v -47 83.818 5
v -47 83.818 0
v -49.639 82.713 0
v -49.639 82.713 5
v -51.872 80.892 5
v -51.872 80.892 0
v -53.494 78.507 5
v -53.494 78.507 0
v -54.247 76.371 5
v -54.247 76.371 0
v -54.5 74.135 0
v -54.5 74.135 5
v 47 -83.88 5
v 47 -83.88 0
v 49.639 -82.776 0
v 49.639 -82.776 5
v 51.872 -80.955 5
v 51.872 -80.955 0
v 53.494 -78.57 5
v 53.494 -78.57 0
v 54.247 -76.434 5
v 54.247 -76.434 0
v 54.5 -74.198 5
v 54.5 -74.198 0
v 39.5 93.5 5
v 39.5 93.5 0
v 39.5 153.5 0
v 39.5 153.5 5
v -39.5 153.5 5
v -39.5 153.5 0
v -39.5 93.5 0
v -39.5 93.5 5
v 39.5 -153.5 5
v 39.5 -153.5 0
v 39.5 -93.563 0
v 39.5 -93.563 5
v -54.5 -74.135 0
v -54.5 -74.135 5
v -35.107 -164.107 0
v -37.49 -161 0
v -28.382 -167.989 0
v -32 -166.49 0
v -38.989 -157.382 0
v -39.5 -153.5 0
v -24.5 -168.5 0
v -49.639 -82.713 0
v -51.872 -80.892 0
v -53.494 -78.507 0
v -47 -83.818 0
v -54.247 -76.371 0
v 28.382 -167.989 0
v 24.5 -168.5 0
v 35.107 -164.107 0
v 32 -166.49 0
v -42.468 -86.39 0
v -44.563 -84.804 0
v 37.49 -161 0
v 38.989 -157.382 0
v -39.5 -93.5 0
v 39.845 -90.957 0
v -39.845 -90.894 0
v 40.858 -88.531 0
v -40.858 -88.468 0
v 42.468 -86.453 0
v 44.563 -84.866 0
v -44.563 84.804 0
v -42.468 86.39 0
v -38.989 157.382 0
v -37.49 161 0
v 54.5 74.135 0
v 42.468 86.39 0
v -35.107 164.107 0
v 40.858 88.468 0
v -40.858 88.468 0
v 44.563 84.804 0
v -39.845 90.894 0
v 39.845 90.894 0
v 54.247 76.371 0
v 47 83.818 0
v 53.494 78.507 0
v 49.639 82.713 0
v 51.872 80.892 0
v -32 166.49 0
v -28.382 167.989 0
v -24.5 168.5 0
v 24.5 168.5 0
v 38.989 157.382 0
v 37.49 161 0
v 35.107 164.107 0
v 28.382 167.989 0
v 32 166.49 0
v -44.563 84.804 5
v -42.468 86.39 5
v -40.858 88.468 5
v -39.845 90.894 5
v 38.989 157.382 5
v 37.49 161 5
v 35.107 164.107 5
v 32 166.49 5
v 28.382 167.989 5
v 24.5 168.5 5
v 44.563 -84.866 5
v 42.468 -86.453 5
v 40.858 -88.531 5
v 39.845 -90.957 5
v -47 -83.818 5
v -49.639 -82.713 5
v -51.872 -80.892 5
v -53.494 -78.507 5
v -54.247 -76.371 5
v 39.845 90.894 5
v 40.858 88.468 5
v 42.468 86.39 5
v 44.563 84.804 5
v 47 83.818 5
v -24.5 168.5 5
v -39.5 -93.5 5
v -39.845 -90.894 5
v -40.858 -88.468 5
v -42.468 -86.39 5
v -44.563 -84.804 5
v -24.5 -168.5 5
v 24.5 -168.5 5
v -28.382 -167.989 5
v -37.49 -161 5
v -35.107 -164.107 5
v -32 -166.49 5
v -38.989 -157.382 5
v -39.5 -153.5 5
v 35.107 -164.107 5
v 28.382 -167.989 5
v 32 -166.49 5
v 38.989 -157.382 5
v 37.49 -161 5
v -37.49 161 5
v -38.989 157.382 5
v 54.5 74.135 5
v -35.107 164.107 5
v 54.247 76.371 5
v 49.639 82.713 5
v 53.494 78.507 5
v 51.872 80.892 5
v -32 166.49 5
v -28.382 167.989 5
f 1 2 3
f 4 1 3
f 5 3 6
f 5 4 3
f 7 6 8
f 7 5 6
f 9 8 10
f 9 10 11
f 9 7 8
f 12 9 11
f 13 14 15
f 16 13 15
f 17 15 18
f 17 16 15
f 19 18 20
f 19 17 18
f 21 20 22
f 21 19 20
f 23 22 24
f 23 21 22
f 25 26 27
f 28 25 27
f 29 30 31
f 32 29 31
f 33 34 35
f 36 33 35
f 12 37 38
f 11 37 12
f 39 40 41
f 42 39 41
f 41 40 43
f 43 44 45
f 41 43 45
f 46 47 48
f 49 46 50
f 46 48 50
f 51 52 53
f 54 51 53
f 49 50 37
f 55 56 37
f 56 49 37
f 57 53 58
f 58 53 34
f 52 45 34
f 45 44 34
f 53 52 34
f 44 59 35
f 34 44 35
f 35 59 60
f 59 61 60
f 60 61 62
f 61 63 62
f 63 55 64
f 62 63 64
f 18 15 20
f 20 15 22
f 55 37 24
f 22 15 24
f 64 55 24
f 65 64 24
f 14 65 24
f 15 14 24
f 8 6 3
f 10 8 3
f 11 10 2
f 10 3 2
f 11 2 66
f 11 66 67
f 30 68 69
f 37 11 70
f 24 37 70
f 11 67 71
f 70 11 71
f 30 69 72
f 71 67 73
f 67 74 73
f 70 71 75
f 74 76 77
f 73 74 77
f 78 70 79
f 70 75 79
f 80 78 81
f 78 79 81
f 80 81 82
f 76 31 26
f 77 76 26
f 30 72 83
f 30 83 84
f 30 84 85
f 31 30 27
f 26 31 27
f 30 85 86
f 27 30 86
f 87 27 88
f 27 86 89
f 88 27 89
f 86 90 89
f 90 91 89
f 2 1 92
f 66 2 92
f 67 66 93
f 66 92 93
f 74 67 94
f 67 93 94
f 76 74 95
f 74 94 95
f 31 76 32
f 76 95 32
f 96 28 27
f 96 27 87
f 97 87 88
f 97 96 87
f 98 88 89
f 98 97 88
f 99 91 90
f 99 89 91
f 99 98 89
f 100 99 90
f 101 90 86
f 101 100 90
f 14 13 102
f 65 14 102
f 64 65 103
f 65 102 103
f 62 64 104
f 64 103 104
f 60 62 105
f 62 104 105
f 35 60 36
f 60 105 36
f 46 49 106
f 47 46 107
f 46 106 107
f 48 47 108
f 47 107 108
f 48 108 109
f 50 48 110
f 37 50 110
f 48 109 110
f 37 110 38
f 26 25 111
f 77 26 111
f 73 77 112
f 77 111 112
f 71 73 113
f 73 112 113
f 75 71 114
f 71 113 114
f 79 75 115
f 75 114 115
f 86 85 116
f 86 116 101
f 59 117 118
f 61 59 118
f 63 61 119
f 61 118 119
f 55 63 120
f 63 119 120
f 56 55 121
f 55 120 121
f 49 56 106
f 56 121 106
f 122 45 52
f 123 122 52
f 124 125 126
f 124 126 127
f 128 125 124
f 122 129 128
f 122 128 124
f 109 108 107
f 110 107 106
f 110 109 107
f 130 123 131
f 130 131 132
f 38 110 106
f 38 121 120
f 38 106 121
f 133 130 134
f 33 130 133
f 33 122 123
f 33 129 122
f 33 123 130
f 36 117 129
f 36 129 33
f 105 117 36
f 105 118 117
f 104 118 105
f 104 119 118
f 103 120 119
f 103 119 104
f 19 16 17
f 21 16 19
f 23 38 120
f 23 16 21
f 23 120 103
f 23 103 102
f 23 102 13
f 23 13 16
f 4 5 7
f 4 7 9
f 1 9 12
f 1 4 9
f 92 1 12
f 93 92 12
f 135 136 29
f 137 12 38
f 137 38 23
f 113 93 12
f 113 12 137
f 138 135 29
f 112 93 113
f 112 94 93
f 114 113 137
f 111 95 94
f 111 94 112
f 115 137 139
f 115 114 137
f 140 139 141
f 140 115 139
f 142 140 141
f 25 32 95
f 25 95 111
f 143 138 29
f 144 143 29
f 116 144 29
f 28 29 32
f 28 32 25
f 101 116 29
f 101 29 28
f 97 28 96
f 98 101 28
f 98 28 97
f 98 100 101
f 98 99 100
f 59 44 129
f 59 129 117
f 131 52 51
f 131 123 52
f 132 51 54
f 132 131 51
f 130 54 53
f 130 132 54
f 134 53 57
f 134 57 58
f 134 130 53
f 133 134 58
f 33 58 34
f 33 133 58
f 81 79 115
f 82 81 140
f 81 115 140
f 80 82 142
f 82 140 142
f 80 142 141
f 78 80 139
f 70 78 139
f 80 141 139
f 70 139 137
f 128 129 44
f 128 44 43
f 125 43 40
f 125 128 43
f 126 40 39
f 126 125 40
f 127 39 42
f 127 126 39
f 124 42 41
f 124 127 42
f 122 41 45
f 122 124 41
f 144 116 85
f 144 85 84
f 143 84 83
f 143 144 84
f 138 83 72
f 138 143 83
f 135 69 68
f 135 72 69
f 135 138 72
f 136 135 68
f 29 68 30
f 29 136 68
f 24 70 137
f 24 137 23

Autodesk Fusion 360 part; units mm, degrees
sketch "Sketch1" plane through (0, 0, 0) normal (0, 0, 1) x (1, 0, 0)
  line L0 (54.5, -188.5) -> (-54.5, -188.5)
  line L1 (-54.5, -188.5) -> (-54.5, 188.5)
  line L2 (-54.5, 188.5) -> (54.5, 188.5)
  line L3 (54.5, 188.5) -> (54.5, -188.5)
  line L4 (54.5, -188.5) -> (-54.5, 188.5) construction
  line L5 (-54.5, -188.5) -> (54.5, 188.5) construction
  line L6 (-54.5, 153.5) -> (-39.5, 153.5)
  line L7 (-39.5, 153.5) -> (-39.5, 83.5)
  line L8 (-39.5, 83.5) -> (-54.5, 83.5)
  line L9 (-54.5, 83.5) -> (-54.5, 153.5)
  line L10 (-54.5, -153.5) -> (-39.5, -153.5)
  line L11 (-39.5, -153.5) -> (-39.5, -83.5)
  line L12 (-39.5, -83.5) -> (-54.5, -83.5)
  line L13 (-54.5, -83.5) -> (-54.5, -153.5)
  line L14 (54.5, -153.5629) -> (39.5, -153.5629)
  line L15 (39.5, -153.5629) -> (39.5, -83.5629)
  line L16 (39.5, -83.5629) -> (54.5, -83.5629)
  line L17 (54.5, -83.5629) -> (54.5, -153.5629)
  line L18 (54.5, 153.5) -> (39.5, 153.5)
  line L19 (39.5, 153.5) -> (39.5, 83.5)
  line L20 (39.5, 83.5) -> (54.5, 83.5)
  line L21 (54.5, 83.5) -> (54.5, 153.5)
  line L22 (-39.5, 153.5) -> (-39.5, 168.5)
  line L23 (-39.5, 168.5) -> (39.5, 168.5)
  line L24 (39.5, 153.5) -> (39.5, 168.5)
  line L25 (-39.5, -153.5) -> (-39.5, -168.5)
  line L26 (-39.5, -168.5) -> (39.5, -168.5)
  line L27 (39.5, -168.5) -> (39.5, -153.5629)
  dimension "d1" = 109
  dimension "d2" = 377
  dimension "d3" = 15
  dimension "d4" = 70
  dimension "d5" = 15
  dimension "d6" = 70
  dimension "d7" = 35
  dimension "d8" = 35
  dimension "d9" = 15
  dimension "d10" = 70
  dimension "d11" = 15
  dimension "d12" = 70
  dimension "d19" = 15
  dimension "d20" = 15
extrude "Extrude1" add sketch "Sketch1" along normal blind 5 contours L1 L3 L7 L8 L11 L12 L15 L16 L19 L20 L22 L23 L24 L25 L26 L27
fillet "Fillet1" radius 10 8 edges at (-39.5, -83.5, 2.5) (-54.5, -83.5, 2.5) (39.5, -83.5629, 2.5) (54.5, -83.5629, 2.5) (39.5, 83.5, 2.5) (54.5, 83.5, 2.5) (-39.5, 83.5, 2.5) (-54.5, 83.5, 2.5)
fillet "Fillet2" radius 15 4 edges at (-39.5, -168.5, 2.5) (39.5, -168.5, 2.5) (39.5, 168.5, 2.5) (-39.5, 168.5, 2.5)
